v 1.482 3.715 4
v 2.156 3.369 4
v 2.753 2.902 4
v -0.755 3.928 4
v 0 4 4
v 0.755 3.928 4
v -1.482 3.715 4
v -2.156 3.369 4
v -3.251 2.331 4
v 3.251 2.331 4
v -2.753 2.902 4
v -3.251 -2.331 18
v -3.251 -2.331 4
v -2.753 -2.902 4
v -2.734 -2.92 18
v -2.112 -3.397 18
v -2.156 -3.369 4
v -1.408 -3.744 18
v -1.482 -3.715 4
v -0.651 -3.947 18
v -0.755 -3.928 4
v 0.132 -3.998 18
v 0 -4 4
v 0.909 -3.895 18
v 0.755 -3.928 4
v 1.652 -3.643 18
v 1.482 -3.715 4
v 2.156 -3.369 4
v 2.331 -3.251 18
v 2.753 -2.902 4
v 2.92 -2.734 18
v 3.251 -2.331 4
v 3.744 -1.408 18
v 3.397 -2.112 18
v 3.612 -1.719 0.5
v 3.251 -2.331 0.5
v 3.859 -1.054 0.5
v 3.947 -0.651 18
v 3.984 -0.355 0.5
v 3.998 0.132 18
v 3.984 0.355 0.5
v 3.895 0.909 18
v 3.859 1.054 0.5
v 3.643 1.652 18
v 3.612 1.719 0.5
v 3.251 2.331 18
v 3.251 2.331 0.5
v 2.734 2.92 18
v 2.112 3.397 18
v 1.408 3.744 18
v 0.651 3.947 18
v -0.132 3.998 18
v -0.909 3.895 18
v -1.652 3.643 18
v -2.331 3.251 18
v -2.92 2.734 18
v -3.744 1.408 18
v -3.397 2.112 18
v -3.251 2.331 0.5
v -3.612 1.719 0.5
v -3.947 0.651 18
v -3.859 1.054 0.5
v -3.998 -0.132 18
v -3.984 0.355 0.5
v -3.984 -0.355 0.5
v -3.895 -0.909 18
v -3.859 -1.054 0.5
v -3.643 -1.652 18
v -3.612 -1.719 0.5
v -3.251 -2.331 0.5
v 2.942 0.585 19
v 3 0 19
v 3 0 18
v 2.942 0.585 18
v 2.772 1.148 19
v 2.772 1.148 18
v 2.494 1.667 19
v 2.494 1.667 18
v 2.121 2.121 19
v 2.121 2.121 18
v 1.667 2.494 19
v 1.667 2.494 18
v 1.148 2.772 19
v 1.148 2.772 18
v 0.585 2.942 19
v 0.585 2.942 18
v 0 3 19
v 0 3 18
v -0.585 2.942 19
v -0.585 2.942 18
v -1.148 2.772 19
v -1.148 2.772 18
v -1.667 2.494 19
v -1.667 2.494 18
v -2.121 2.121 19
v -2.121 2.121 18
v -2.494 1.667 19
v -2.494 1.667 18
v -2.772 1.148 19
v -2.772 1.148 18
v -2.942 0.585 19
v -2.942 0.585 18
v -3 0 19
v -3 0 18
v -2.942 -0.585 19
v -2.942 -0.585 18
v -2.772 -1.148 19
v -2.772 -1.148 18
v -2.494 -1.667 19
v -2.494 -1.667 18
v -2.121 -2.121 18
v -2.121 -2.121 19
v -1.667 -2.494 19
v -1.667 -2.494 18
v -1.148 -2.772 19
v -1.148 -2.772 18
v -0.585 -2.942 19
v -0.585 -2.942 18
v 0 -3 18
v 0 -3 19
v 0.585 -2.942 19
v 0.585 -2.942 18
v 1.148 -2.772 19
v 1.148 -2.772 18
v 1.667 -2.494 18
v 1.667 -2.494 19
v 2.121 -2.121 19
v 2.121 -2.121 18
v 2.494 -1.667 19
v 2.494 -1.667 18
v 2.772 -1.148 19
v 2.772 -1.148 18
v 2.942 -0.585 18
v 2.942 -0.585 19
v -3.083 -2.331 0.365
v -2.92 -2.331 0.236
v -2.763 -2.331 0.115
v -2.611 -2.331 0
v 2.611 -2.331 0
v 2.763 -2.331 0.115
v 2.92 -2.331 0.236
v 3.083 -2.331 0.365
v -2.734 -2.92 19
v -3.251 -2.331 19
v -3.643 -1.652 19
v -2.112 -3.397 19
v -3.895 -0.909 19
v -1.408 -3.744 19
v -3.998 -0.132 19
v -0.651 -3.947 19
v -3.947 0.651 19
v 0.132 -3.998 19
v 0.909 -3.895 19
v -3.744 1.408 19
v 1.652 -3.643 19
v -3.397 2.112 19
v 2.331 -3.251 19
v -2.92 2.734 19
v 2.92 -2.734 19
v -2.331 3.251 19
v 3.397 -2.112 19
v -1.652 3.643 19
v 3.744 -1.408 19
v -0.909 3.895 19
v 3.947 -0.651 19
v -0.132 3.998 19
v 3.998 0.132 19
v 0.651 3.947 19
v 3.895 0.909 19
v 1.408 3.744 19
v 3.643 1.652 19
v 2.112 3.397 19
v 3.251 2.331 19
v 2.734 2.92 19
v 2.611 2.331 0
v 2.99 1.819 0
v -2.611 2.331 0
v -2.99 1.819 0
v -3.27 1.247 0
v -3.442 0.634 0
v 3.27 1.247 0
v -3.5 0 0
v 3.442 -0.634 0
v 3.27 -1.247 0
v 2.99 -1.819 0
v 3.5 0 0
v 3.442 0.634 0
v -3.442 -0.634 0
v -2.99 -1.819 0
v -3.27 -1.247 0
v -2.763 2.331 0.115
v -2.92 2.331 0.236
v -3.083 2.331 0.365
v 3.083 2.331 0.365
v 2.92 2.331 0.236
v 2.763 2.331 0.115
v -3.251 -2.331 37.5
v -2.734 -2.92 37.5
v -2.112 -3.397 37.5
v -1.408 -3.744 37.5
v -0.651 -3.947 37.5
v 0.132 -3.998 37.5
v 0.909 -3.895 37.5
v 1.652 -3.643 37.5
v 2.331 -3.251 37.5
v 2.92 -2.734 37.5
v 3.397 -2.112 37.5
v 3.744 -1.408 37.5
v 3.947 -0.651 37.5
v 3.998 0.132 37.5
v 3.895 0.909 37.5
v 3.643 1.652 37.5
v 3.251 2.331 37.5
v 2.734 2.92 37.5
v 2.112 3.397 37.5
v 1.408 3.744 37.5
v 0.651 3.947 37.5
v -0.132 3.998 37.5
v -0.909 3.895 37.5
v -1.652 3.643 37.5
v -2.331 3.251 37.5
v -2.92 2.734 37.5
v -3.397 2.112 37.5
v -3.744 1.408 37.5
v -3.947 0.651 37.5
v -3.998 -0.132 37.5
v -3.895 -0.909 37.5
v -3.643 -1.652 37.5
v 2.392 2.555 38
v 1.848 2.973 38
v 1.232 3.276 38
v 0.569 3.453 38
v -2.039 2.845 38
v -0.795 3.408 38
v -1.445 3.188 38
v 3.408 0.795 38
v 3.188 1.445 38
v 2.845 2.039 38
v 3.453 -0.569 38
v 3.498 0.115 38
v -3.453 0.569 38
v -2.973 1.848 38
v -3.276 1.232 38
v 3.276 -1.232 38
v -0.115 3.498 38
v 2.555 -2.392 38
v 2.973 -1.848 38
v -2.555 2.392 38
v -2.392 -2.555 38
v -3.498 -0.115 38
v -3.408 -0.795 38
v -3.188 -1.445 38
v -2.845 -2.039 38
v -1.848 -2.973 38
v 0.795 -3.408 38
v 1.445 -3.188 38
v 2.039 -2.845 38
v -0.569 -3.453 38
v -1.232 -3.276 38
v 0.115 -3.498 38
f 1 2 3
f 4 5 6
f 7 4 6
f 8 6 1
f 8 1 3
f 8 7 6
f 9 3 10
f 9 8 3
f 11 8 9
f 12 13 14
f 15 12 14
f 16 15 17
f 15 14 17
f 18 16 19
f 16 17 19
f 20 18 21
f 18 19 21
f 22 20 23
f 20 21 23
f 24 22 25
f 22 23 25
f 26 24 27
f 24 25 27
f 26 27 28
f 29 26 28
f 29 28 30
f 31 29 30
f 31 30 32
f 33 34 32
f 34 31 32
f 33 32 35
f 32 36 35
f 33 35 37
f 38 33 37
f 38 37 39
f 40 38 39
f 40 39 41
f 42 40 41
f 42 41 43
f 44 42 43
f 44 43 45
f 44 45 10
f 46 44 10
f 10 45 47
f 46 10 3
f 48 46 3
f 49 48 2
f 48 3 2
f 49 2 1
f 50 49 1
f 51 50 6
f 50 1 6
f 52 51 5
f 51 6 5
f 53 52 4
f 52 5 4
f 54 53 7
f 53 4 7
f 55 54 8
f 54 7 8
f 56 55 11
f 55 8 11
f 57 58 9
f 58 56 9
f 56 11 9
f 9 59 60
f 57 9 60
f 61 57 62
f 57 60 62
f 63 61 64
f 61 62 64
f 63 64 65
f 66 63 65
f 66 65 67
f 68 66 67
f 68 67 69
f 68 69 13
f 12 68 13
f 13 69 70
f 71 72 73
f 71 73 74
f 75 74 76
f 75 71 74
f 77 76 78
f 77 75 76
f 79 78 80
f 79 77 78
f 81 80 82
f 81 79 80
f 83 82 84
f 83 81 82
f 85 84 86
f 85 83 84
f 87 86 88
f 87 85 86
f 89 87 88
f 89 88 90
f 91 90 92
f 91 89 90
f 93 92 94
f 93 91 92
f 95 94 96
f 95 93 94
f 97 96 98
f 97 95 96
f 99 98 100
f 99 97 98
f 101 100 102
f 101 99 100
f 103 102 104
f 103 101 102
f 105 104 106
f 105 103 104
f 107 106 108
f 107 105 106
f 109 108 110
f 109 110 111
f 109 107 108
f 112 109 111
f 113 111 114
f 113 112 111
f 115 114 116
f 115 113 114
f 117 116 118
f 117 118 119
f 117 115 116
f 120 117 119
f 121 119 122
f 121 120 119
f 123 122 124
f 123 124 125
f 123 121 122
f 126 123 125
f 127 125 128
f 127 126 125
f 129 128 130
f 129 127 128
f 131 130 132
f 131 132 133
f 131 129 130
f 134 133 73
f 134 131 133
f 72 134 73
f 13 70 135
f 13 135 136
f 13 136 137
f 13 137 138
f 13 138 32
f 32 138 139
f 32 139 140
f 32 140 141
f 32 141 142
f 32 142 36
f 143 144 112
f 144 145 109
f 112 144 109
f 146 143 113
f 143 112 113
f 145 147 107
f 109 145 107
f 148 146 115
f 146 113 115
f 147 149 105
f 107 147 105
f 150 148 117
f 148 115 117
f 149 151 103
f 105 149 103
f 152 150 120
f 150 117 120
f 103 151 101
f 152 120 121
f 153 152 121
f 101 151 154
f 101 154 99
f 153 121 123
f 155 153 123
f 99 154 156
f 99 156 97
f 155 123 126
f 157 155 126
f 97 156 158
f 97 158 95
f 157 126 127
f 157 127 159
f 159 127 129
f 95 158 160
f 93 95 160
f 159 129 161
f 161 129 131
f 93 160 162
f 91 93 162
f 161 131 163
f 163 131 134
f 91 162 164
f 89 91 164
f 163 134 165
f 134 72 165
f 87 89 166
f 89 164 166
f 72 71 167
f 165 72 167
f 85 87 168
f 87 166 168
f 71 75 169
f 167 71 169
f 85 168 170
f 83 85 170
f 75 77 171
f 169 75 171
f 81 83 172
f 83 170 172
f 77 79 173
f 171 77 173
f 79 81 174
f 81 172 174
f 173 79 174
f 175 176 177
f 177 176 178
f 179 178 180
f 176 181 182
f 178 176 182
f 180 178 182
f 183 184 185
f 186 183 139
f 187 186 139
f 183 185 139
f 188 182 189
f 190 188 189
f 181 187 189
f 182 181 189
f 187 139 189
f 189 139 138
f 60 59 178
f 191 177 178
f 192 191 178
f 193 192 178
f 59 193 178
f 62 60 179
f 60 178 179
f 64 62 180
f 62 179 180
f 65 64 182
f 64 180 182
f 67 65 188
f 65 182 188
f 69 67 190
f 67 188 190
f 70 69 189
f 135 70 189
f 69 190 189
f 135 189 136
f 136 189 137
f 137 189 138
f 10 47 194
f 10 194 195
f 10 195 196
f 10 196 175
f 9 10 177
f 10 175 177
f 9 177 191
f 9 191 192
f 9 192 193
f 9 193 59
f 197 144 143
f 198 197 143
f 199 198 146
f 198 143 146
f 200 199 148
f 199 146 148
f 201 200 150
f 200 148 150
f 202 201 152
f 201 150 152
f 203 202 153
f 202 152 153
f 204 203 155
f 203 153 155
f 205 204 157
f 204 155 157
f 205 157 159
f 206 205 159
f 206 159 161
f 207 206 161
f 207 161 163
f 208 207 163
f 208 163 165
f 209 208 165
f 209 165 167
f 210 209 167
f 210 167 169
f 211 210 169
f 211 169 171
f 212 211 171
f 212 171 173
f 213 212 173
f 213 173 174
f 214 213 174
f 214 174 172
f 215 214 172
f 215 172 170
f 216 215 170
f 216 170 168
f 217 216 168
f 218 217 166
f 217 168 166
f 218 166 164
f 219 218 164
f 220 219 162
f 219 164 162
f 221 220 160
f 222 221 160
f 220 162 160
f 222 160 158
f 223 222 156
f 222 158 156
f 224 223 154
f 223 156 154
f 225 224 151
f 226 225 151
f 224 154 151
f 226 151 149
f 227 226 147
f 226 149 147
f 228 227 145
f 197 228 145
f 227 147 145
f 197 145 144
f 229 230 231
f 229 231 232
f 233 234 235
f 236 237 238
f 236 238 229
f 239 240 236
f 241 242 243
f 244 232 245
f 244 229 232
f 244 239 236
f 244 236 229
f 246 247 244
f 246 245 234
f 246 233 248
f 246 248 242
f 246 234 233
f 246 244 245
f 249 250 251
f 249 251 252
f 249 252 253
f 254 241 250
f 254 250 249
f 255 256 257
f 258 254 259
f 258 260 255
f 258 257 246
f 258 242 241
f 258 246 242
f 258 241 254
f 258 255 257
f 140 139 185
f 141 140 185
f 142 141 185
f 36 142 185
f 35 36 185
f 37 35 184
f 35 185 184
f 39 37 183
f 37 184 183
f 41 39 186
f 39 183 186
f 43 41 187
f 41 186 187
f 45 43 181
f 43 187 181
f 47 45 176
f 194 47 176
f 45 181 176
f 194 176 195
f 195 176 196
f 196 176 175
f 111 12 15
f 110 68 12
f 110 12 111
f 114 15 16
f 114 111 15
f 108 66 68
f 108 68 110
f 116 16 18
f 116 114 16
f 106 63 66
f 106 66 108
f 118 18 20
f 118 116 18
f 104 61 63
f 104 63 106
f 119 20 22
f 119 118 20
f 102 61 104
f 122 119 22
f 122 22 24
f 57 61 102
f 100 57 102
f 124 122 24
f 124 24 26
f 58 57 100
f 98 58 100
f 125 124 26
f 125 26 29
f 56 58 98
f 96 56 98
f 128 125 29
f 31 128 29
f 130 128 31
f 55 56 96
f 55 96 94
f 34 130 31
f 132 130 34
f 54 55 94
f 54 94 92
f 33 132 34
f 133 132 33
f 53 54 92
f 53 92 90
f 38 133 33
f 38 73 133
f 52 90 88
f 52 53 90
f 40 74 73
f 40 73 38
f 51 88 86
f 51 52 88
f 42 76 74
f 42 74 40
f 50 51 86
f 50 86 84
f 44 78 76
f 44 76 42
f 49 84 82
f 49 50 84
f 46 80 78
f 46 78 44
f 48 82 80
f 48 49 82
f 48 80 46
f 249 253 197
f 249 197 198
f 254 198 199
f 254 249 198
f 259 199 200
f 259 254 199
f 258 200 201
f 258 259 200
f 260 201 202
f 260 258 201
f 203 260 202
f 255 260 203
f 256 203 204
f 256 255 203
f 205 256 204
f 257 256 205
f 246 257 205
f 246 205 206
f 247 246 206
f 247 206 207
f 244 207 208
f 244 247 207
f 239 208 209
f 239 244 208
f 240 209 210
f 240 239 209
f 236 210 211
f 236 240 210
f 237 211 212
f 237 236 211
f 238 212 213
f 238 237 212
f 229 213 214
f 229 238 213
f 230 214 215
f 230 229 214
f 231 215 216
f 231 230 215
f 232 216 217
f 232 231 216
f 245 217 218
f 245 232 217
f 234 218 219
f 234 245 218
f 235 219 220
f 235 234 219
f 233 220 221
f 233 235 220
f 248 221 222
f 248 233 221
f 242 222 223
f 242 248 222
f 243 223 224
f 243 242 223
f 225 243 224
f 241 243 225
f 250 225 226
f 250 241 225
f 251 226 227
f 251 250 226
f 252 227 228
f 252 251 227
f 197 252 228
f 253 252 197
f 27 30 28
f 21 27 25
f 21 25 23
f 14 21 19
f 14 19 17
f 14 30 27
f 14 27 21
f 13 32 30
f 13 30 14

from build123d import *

# Parameters (mm, degrees)
ESQUISSE1_R             = 4
BASE_EXTRUSION_DEPTH    = 38
CHANFREIN1_SIZE         = 0.5
ESQUISSE2_OUTSIDE_W     = 17.93
ESQUISSE2_OUTSIDE_H     = 17.93
ESQUISSE2_OUTSIDE_R     = 3
ENL_V_MAT_EXTRU_1_DEPTH = 1
ESQUISSE3_OUTSIDE_W     = 17.93
ESQUISSE3_OUTSIDE_H     = 17.93
ENL_V_MAT_EXTRU_2_DEPTH = 4


with BuildPart() as part:
    # Esquisse1 → Base-Extrusion (new body)
    with BuildSketch(Plane.XY):
        with Locations(Location((0, 0, 0), (0, 0, 215.635694855))):
            Circle(ESQUISSE1_R)
    extrude(amount=BASE_EXTRUSION_DEPTH)

    # Chanfrein1
    chanfrein1_edges = [part.edges().sort_by_distance(p)[0] for p in [
        (3.25095178, 2.330517652, 0),
        (3.25095178, 2.330517652, 38),
    ]]
    chamfer(chanfrein1_edges, length=CHANFREIN1_SIZE)

    # Esquisse2 outside → Enlèv. mat.-Extru.1 (cut)
    with BuildSketch(Plane.XY.offset(19)):
        Rectangle(ESQUISSE2_OUTSIDE_W, ESQUISSE2_OUTSIDE_H)
        Circle(ESQUISSE2_OUTSIDE_R, mode=Mode.SUBTRACT)
    extrude(amount=-ENL_V_MAT_EXTRU_1_DEPTH, mode=Mode.SUBTRACT)

    # Esquisse3 outside → Enlèv. mat.-Extru.2 (cut)
    with BuildSketch(Plane(origin=(0, 0, 0), x_dir=(-1, 0, 0), z_dir=(0, 0, -1))):
        Rectangle(ESQUISSE3_OUTSIDE_W, ESQUISSE3_OUTSIDE_H)
        with BuildLine():
            Line((-3.25095178, 2.330517652), (3.25095178, 2.330517652))
            ThreePointArc((3.25095178, 2.330517652), (4, 0), (3.25095178, -2.330517652))
            Line((3.25095178, -2.330517652), (-3.25095178, -2.330517652))
            ThreePointArc((-3.25095178, -2.330517652), (-4, 0), (-3.25095178, 2.330517652))
        make_face(mode=Mode.SUBTRACT)
    extrude(amount=-ENL_V_MAT_EXTRU_2_DEPTH, mode=Mode.SUBTRACT)


solid = part.part
